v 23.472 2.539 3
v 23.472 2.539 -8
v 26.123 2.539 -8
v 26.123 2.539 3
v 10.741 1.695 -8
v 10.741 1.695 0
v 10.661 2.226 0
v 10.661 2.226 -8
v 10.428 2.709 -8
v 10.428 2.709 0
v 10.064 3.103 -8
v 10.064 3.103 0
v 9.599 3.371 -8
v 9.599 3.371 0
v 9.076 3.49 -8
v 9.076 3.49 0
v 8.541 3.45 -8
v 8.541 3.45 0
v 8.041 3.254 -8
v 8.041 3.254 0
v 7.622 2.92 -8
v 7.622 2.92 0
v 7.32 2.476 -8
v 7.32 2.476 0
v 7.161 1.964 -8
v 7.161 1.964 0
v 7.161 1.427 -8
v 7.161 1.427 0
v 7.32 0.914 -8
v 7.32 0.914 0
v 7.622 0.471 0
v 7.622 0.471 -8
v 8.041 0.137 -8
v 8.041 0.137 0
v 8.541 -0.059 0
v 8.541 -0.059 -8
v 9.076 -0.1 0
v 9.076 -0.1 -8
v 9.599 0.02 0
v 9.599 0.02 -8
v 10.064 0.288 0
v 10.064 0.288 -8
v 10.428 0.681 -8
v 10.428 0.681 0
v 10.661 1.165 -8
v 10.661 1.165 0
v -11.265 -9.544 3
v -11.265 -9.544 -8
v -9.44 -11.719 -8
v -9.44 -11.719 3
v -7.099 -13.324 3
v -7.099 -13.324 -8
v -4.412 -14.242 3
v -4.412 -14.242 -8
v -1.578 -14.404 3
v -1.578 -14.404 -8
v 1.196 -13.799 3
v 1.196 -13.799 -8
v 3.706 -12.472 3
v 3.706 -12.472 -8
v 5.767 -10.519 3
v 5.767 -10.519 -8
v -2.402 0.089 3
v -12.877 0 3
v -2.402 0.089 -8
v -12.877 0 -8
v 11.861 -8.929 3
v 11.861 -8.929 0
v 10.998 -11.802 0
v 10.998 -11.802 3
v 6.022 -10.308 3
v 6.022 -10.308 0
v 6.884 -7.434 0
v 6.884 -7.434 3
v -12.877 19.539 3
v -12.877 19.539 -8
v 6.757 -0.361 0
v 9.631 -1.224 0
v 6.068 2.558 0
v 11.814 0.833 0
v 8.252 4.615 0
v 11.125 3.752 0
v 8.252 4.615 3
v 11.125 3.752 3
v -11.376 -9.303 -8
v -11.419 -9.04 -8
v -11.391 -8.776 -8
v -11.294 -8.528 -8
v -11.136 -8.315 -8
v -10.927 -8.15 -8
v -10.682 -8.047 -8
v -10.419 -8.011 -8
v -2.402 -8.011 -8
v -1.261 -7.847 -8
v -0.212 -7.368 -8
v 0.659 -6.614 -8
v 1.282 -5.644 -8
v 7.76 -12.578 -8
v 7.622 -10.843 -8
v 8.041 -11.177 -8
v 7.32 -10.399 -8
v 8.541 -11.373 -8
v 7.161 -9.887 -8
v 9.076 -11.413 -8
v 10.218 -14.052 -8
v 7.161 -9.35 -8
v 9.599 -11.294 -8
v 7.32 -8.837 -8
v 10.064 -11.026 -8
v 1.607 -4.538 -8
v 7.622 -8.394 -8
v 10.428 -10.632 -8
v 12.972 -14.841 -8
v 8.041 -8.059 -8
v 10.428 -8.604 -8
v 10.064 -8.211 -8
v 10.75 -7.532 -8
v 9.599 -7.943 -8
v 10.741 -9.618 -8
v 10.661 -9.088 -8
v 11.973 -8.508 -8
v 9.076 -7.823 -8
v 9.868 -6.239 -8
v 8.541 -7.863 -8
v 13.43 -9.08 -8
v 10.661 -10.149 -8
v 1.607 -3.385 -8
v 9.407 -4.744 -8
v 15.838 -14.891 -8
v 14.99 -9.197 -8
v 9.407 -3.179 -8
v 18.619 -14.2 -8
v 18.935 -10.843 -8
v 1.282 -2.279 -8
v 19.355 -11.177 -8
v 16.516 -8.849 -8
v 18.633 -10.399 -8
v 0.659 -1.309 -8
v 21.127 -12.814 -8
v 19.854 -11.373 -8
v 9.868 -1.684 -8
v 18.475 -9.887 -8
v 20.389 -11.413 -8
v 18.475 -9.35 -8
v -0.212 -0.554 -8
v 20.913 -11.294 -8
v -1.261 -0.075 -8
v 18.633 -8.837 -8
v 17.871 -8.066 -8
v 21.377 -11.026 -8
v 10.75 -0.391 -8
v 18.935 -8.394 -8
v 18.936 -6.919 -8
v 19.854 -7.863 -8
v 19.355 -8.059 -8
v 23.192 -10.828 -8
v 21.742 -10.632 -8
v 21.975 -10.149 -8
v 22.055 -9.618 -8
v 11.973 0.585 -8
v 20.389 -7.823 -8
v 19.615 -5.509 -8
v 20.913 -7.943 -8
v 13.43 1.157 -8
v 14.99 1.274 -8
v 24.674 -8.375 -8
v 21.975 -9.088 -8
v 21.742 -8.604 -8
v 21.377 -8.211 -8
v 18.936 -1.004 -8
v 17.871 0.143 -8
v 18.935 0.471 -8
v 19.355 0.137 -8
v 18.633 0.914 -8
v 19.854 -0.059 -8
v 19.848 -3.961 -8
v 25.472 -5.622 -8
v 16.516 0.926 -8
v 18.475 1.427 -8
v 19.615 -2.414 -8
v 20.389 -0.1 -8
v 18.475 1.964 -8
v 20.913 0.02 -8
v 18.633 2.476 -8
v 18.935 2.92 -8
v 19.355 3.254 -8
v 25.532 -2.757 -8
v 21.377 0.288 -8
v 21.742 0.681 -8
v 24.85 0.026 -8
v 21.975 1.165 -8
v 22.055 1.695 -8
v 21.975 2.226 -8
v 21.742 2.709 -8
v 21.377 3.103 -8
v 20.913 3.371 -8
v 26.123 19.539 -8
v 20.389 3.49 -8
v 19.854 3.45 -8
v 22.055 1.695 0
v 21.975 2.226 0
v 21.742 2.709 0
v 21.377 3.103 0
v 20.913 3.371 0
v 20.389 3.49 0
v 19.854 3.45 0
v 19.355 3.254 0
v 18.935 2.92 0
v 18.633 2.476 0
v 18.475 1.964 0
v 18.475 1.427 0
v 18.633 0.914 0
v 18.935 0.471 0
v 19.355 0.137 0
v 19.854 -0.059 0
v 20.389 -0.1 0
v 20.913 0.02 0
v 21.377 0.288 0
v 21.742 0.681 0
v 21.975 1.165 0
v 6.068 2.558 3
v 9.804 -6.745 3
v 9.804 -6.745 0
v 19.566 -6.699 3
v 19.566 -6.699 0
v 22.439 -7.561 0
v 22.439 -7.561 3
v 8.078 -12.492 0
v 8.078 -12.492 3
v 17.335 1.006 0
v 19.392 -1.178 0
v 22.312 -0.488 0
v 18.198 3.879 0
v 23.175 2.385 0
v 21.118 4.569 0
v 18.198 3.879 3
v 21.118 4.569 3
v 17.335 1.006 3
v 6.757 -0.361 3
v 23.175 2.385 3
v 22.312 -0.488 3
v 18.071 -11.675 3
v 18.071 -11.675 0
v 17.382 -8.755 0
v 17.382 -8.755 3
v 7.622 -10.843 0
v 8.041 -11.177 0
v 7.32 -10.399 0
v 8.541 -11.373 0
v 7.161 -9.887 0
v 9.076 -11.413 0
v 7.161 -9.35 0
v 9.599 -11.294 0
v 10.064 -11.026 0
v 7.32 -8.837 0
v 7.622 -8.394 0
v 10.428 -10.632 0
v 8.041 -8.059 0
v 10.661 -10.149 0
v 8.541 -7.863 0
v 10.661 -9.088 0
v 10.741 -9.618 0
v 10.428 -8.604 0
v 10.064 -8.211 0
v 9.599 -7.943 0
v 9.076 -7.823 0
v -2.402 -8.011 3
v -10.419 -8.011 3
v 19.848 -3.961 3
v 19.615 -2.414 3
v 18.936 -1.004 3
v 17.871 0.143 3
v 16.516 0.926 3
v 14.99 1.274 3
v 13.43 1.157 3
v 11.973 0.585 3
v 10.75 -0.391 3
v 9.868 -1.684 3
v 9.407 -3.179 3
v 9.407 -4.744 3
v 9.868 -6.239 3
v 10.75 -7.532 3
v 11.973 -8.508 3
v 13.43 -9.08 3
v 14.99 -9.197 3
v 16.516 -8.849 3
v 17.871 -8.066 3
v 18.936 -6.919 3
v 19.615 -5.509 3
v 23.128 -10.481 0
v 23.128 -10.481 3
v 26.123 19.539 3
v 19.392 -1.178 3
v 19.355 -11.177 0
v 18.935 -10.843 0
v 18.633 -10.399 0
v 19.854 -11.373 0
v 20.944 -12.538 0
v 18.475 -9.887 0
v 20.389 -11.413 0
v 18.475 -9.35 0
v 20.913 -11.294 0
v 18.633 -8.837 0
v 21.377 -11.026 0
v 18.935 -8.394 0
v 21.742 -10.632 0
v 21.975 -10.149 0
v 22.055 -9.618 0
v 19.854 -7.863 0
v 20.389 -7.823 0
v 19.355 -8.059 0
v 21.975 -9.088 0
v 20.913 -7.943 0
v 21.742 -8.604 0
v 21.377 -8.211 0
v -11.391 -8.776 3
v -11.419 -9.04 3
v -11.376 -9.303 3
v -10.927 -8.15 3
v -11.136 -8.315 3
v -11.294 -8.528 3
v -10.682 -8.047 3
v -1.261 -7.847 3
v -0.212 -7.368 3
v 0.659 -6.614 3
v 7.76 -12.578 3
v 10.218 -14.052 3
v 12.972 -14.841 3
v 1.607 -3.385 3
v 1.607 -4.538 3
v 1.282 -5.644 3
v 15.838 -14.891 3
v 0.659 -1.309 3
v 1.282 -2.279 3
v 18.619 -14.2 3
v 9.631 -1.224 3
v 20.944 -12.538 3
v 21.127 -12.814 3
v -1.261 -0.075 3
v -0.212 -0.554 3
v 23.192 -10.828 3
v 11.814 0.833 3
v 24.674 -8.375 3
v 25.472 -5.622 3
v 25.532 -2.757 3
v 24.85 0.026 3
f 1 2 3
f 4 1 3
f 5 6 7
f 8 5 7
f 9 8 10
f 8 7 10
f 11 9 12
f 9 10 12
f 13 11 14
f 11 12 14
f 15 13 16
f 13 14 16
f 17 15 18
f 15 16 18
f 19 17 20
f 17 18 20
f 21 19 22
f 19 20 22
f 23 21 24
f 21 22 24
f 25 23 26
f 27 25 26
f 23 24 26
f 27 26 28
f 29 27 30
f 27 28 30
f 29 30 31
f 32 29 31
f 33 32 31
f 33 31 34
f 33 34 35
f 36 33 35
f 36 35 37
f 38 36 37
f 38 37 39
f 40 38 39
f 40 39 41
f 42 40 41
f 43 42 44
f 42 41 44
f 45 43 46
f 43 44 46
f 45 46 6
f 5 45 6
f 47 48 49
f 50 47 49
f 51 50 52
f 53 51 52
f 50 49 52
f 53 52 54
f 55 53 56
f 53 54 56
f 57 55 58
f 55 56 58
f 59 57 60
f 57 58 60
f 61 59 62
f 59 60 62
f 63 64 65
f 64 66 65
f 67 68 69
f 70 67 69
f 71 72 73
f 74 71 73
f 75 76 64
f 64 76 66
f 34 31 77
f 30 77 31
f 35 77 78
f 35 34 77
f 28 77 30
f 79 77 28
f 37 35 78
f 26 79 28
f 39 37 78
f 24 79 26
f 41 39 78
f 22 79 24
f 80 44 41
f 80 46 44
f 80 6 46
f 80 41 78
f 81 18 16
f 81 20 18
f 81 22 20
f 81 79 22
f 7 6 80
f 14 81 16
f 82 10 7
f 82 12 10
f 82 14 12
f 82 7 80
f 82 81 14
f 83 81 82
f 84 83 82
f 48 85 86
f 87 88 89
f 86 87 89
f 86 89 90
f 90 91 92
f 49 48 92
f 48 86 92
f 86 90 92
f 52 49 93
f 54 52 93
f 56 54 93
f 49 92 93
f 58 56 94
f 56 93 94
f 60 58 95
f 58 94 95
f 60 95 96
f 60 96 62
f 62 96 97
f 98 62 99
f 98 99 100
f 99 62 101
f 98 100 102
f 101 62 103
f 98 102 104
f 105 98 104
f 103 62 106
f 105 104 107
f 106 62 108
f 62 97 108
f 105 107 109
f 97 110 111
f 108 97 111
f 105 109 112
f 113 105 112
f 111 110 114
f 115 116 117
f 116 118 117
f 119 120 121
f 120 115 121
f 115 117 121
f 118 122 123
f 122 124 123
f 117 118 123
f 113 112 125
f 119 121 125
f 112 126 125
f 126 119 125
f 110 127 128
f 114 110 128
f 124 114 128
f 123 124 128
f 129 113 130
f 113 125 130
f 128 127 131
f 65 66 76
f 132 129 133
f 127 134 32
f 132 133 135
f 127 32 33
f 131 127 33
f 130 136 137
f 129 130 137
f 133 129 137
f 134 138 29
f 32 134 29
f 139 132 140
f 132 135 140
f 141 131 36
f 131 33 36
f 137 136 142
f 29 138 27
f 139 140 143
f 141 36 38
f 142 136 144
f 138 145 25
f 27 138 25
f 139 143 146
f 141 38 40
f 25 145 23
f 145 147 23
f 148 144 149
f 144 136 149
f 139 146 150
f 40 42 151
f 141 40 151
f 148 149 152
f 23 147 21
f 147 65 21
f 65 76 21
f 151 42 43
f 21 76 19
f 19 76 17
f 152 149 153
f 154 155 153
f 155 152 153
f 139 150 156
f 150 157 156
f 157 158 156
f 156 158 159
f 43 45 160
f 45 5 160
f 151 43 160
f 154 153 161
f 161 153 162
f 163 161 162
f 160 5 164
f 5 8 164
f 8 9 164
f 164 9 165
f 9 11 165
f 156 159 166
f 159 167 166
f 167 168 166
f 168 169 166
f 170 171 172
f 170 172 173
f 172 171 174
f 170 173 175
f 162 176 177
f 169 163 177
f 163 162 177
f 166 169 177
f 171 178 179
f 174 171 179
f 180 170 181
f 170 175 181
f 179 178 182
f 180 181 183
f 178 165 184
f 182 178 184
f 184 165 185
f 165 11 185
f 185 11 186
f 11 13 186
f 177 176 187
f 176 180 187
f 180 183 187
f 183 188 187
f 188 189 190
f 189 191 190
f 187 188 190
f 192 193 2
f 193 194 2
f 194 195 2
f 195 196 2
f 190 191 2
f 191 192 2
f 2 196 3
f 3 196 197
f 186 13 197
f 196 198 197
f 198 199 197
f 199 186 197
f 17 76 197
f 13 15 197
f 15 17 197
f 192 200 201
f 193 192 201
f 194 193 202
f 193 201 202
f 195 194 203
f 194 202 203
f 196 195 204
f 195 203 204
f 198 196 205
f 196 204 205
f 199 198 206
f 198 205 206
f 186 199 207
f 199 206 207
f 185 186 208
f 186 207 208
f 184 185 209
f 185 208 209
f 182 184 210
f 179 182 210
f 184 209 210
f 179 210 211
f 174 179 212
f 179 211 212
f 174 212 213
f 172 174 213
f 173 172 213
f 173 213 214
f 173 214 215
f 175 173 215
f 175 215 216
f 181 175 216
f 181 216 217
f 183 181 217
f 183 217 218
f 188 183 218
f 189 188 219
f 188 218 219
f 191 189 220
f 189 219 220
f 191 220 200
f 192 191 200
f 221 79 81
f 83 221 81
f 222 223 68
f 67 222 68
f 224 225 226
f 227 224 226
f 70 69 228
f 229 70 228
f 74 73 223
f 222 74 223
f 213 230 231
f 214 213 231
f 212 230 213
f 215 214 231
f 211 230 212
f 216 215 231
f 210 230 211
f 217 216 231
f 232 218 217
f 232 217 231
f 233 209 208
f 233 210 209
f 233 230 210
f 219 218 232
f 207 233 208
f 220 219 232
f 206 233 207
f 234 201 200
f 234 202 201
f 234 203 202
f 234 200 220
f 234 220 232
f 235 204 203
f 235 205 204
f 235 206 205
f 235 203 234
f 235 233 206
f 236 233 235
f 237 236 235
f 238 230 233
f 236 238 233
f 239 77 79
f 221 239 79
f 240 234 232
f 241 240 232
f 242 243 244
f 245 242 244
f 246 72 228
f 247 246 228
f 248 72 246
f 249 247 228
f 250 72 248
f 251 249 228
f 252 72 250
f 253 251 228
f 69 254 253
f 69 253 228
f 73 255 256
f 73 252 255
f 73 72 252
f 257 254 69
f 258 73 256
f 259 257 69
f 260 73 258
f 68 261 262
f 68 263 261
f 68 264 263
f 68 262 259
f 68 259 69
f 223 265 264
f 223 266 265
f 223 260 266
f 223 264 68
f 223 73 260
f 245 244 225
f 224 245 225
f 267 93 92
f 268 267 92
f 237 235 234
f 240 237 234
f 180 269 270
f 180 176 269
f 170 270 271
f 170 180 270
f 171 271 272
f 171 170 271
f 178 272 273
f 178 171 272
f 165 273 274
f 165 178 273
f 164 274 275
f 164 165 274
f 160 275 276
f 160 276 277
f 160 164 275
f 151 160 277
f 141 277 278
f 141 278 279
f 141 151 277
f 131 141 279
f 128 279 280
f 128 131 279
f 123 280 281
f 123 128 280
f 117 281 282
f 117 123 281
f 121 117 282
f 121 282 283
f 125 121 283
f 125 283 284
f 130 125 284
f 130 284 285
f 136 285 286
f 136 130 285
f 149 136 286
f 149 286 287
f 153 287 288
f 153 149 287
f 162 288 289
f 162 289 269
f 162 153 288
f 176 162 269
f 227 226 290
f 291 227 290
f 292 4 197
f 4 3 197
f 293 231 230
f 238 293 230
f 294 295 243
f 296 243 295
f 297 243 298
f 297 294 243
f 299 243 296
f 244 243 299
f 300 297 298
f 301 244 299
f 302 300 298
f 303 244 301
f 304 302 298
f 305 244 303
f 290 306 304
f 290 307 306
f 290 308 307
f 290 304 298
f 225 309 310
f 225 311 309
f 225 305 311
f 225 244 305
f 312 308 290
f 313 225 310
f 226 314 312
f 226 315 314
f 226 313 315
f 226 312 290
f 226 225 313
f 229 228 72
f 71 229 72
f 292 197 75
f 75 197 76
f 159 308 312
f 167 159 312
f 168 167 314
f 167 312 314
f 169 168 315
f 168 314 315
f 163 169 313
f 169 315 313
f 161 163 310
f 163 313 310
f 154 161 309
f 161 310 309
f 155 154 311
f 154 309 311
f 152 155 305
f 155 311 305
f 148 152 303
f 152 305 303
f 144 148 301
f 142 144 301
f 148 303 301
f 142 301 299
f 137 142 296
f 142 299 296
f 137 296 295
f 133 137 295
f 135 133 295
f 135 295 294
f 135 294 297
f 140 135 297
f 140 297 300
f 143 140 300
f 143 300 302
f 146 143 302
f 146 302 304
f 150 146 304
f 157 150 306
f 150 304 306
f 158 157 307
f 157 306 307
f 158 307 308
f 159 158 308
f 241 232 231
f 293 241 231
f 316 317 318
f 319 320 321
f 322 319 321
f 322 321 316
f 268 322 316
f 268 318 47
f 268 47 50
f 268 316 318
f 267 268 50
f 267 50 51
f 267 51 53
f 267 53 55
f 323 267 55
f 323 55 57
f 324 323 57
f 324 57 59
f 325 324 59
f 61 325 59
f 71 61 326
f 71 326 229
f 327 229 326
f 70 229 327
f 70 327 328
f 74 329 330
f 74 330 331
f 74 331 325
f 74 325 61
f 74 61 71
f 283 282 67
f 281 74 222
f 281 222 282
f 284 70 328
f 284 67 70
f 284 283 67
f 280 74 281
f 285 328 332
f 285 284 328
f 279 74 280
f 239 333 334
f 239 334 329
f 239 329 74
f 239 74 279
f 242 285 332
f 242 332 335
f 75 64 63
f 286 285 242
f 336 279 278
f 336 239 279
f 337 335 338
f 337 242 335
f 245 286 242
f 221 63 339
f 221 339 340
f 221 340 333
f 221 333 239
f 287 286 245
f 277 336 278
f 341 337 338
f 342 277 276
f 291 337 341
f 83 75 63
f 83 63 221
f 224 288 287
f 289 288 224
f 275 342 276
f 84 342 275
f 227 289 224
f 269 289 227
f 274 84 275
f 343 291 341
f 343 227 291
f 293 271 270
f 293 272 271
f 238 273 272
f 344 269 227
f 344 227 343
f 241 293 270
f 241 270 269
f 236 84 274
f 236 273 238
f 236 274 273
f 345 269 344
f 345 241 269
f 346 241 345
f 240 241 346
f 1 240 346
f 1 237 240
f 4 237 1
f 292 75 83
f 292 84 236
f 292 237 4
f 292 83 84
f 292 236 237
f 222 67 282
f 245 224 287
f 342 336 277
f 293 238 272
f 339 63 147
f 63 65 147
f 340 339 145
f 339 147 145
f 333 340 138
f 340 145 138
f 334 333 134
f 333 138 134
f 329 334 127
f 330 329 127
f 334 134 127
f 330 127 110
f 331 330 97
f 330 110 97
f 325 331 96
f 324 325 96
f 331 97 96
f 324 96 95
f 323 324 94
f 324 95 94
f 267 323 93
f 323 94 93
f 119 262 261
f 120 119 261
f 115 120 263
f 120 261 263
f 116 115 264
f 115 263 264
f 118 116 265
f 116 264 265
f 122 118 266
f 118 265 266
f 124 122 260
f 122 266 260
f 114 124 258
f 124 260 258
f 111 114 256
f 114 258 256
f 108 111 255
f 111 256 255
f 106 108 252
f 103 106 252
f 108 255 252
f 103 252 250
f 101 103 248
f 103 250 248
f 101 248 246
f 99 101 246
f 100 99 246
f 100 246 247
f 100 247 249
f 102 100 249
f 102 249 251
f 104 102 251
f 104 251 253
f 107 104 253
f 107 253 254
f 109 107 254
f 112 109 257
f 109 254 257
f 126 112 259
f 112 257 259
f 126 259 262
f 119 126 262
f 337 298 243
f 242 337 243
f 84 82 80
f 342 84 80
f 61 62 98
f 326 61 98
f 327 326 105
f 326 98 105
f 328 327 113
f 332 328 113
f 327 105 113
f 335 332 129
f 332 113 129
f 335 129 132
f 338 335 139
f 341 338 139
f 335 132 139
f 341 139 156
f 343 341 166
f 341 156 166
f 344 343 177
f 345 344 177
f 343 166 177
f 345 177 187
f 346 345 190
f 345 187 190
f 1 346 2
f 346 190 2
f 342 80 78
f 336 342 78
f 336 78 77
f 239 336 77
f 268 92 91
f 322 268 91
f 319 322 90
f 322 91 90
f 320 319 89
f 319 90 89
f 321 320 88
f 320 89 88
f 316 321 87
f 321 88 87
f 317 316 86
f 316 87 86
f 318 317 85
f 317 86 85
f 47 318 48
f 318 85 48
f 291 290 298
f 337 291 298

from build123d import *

# Parameters (mm, degrees)
F0_R     = 1.8
F0_R_2   = 5.25
F1_DEPTH = 8
F2_R     = 5.25
F3_DEPTH = 3


with BuildPart() as f1:
    # F0 (on Top) → F1 (new body)
    with BuildSketch(Plane.XY):
        with BuildLine():
            Line((26.1231140105, 19.538577646), (-12.8768859895, 19.538577646))
            Line((-12.8768859895, 19.538577646), (-12.8768859895, 0))
            Line((-12.8768859895, 0), (-2.4018859895, 0.088577646))
            ThreePointArc((-2.4018859895, 0.088577646), (1.6481140105, -3.961422354), (-2.4018859895, -8.011422354))
            Line((-2.4018859895, -8.011422354), (-10.4189381286, -8.011422354))
            ThreePointArc((-10.4189381286, -8.011422354), (-11.2944327118, -8.5281944214), (-11.2650650034, -9.5444038843))
            ThreePointArc((-11.2650650034, -9.5444038843), (-3.0003647918, -14.4193116307), (5.7665147457, -10.5190785227))
            ThreePointArc((5.7665147457, -10.5190785227), (21.1269767102, -12.8143287608), (23.4722336851, 2.538577646))
            Line((23.4722336851, 2.538577646), (26.1231140105, 2.538577646))
            Line((26.1231140105, 2.538577646), (26.1231140105, 19.538577646))
        make_face()
        with Locations((8.941259761, -9.6182766035)):
            Circle(F0_R, mode=Mode.SUBTRACT)
        with Locations((20.2549682599, -9.6182766035)):
            Circle(F0_R, mode=Mode.SUBTRACT)
        with Locations((14.5981140105, -3.961422354)):
            Circle(F0_R_2, mode=Mode.SUBTRACT)
        with Locations((8.941259761, 1.6954318955)):
            Circle(F0_R, mode=Mode.SUBTRACT)
        with Locations((20.2549682599, 1.6954318955)):
            Circle(F0_R, mode=Mode.SUBTRACT)
    extrude(amount=-F1_DEPTH)

    # F2 (on face) → F3 (join)
    with BuildSketch(Plane.XY):
        with BuildLine():
            Line((23.4722336851, 2.538577646), (26.1231140105, 2.538577646))
            Line((26.1231140105, 2.538577646), (26.1231140105, 19.538577646))
            Line((26.1231140105, 19.538577646), (-12.8768859895, 19.538577646))
            Line((-12.8768859895, 19.538577646), (-12.8768859895, 0))
            Line((-12.8768859895, 0), (-2.4018859895, 0.088577646))
            ThreePointArc((-2.4018859895, 0.088577646), (1.6481140105, -3.961422354), (-2.4018859895, -8.011422354))
            Line((-2.4018859895, -8.011422354), (-10.4189381286, -8.011422354))
            ThreePointArc((-10.4189381286, -8.011422354), (-11.2944327118, -8.5281944214), (-11.2650650034, -9.5444038843))
            ThreePointArc((-11.2650650034, -9.5444038843), (-3.0003647918, -14.4193116307), (5.7665147457, -10.5190785227))
            ThreePointArc((5.7665147457, -10.5190785227), (21.1269767102, -12.8143287608), (23.4722336851, 2.538577646))
        make_face()
        Polygon((10.9981298784, -11.8021459494), (8.0784084876, -12.4915130504), (6.0215383702, -10.3076437046), (6.8843896435, -7.4344072576), (9.8041110343, -6.7450401565), (11.8609811518, -8.9289095024), align=None, mode=Mode.SUBTRACT)
        Polygon((19.5656011589, -6.6985552127), (22.4388376058, -7.561406486), (23.1282047069, -10.4811278768), (20.944335361, -12.5379979943), (18.0710989141, -11.6751467209), (17.381731813, -8.7554253301), align=None, mode=Mode.SUBTRACT)
        with Locations((14.5981140105, -3.961422354)):
            Circle(F2_R, mode=Mode.SUBTRACT)
        Polygon((6.7573904151, -0.361438222), (6.068023314, 2.5582831689), (8.2518926599, 4.6151532863), (11.1251291068, 3.752302013), (11.8144962079, 0.8325806222), (9.630626862, -1.2242894953), align=None, mode=Mode.SUBTRACT)
        Polygon((18.1980981425, 3.8793012414), (21.1178195333, 4.5686683425), (23.1746896508, 2.3847989966), (22.3118383774, -0.4884374504), (19.3921169866, -1.1778045514), (17.3352468691, 1.0060647944), align=None, mode=Mode.SUBTRACT)
    extrude(amount=F3_DEPTH)


solid = f1.part
